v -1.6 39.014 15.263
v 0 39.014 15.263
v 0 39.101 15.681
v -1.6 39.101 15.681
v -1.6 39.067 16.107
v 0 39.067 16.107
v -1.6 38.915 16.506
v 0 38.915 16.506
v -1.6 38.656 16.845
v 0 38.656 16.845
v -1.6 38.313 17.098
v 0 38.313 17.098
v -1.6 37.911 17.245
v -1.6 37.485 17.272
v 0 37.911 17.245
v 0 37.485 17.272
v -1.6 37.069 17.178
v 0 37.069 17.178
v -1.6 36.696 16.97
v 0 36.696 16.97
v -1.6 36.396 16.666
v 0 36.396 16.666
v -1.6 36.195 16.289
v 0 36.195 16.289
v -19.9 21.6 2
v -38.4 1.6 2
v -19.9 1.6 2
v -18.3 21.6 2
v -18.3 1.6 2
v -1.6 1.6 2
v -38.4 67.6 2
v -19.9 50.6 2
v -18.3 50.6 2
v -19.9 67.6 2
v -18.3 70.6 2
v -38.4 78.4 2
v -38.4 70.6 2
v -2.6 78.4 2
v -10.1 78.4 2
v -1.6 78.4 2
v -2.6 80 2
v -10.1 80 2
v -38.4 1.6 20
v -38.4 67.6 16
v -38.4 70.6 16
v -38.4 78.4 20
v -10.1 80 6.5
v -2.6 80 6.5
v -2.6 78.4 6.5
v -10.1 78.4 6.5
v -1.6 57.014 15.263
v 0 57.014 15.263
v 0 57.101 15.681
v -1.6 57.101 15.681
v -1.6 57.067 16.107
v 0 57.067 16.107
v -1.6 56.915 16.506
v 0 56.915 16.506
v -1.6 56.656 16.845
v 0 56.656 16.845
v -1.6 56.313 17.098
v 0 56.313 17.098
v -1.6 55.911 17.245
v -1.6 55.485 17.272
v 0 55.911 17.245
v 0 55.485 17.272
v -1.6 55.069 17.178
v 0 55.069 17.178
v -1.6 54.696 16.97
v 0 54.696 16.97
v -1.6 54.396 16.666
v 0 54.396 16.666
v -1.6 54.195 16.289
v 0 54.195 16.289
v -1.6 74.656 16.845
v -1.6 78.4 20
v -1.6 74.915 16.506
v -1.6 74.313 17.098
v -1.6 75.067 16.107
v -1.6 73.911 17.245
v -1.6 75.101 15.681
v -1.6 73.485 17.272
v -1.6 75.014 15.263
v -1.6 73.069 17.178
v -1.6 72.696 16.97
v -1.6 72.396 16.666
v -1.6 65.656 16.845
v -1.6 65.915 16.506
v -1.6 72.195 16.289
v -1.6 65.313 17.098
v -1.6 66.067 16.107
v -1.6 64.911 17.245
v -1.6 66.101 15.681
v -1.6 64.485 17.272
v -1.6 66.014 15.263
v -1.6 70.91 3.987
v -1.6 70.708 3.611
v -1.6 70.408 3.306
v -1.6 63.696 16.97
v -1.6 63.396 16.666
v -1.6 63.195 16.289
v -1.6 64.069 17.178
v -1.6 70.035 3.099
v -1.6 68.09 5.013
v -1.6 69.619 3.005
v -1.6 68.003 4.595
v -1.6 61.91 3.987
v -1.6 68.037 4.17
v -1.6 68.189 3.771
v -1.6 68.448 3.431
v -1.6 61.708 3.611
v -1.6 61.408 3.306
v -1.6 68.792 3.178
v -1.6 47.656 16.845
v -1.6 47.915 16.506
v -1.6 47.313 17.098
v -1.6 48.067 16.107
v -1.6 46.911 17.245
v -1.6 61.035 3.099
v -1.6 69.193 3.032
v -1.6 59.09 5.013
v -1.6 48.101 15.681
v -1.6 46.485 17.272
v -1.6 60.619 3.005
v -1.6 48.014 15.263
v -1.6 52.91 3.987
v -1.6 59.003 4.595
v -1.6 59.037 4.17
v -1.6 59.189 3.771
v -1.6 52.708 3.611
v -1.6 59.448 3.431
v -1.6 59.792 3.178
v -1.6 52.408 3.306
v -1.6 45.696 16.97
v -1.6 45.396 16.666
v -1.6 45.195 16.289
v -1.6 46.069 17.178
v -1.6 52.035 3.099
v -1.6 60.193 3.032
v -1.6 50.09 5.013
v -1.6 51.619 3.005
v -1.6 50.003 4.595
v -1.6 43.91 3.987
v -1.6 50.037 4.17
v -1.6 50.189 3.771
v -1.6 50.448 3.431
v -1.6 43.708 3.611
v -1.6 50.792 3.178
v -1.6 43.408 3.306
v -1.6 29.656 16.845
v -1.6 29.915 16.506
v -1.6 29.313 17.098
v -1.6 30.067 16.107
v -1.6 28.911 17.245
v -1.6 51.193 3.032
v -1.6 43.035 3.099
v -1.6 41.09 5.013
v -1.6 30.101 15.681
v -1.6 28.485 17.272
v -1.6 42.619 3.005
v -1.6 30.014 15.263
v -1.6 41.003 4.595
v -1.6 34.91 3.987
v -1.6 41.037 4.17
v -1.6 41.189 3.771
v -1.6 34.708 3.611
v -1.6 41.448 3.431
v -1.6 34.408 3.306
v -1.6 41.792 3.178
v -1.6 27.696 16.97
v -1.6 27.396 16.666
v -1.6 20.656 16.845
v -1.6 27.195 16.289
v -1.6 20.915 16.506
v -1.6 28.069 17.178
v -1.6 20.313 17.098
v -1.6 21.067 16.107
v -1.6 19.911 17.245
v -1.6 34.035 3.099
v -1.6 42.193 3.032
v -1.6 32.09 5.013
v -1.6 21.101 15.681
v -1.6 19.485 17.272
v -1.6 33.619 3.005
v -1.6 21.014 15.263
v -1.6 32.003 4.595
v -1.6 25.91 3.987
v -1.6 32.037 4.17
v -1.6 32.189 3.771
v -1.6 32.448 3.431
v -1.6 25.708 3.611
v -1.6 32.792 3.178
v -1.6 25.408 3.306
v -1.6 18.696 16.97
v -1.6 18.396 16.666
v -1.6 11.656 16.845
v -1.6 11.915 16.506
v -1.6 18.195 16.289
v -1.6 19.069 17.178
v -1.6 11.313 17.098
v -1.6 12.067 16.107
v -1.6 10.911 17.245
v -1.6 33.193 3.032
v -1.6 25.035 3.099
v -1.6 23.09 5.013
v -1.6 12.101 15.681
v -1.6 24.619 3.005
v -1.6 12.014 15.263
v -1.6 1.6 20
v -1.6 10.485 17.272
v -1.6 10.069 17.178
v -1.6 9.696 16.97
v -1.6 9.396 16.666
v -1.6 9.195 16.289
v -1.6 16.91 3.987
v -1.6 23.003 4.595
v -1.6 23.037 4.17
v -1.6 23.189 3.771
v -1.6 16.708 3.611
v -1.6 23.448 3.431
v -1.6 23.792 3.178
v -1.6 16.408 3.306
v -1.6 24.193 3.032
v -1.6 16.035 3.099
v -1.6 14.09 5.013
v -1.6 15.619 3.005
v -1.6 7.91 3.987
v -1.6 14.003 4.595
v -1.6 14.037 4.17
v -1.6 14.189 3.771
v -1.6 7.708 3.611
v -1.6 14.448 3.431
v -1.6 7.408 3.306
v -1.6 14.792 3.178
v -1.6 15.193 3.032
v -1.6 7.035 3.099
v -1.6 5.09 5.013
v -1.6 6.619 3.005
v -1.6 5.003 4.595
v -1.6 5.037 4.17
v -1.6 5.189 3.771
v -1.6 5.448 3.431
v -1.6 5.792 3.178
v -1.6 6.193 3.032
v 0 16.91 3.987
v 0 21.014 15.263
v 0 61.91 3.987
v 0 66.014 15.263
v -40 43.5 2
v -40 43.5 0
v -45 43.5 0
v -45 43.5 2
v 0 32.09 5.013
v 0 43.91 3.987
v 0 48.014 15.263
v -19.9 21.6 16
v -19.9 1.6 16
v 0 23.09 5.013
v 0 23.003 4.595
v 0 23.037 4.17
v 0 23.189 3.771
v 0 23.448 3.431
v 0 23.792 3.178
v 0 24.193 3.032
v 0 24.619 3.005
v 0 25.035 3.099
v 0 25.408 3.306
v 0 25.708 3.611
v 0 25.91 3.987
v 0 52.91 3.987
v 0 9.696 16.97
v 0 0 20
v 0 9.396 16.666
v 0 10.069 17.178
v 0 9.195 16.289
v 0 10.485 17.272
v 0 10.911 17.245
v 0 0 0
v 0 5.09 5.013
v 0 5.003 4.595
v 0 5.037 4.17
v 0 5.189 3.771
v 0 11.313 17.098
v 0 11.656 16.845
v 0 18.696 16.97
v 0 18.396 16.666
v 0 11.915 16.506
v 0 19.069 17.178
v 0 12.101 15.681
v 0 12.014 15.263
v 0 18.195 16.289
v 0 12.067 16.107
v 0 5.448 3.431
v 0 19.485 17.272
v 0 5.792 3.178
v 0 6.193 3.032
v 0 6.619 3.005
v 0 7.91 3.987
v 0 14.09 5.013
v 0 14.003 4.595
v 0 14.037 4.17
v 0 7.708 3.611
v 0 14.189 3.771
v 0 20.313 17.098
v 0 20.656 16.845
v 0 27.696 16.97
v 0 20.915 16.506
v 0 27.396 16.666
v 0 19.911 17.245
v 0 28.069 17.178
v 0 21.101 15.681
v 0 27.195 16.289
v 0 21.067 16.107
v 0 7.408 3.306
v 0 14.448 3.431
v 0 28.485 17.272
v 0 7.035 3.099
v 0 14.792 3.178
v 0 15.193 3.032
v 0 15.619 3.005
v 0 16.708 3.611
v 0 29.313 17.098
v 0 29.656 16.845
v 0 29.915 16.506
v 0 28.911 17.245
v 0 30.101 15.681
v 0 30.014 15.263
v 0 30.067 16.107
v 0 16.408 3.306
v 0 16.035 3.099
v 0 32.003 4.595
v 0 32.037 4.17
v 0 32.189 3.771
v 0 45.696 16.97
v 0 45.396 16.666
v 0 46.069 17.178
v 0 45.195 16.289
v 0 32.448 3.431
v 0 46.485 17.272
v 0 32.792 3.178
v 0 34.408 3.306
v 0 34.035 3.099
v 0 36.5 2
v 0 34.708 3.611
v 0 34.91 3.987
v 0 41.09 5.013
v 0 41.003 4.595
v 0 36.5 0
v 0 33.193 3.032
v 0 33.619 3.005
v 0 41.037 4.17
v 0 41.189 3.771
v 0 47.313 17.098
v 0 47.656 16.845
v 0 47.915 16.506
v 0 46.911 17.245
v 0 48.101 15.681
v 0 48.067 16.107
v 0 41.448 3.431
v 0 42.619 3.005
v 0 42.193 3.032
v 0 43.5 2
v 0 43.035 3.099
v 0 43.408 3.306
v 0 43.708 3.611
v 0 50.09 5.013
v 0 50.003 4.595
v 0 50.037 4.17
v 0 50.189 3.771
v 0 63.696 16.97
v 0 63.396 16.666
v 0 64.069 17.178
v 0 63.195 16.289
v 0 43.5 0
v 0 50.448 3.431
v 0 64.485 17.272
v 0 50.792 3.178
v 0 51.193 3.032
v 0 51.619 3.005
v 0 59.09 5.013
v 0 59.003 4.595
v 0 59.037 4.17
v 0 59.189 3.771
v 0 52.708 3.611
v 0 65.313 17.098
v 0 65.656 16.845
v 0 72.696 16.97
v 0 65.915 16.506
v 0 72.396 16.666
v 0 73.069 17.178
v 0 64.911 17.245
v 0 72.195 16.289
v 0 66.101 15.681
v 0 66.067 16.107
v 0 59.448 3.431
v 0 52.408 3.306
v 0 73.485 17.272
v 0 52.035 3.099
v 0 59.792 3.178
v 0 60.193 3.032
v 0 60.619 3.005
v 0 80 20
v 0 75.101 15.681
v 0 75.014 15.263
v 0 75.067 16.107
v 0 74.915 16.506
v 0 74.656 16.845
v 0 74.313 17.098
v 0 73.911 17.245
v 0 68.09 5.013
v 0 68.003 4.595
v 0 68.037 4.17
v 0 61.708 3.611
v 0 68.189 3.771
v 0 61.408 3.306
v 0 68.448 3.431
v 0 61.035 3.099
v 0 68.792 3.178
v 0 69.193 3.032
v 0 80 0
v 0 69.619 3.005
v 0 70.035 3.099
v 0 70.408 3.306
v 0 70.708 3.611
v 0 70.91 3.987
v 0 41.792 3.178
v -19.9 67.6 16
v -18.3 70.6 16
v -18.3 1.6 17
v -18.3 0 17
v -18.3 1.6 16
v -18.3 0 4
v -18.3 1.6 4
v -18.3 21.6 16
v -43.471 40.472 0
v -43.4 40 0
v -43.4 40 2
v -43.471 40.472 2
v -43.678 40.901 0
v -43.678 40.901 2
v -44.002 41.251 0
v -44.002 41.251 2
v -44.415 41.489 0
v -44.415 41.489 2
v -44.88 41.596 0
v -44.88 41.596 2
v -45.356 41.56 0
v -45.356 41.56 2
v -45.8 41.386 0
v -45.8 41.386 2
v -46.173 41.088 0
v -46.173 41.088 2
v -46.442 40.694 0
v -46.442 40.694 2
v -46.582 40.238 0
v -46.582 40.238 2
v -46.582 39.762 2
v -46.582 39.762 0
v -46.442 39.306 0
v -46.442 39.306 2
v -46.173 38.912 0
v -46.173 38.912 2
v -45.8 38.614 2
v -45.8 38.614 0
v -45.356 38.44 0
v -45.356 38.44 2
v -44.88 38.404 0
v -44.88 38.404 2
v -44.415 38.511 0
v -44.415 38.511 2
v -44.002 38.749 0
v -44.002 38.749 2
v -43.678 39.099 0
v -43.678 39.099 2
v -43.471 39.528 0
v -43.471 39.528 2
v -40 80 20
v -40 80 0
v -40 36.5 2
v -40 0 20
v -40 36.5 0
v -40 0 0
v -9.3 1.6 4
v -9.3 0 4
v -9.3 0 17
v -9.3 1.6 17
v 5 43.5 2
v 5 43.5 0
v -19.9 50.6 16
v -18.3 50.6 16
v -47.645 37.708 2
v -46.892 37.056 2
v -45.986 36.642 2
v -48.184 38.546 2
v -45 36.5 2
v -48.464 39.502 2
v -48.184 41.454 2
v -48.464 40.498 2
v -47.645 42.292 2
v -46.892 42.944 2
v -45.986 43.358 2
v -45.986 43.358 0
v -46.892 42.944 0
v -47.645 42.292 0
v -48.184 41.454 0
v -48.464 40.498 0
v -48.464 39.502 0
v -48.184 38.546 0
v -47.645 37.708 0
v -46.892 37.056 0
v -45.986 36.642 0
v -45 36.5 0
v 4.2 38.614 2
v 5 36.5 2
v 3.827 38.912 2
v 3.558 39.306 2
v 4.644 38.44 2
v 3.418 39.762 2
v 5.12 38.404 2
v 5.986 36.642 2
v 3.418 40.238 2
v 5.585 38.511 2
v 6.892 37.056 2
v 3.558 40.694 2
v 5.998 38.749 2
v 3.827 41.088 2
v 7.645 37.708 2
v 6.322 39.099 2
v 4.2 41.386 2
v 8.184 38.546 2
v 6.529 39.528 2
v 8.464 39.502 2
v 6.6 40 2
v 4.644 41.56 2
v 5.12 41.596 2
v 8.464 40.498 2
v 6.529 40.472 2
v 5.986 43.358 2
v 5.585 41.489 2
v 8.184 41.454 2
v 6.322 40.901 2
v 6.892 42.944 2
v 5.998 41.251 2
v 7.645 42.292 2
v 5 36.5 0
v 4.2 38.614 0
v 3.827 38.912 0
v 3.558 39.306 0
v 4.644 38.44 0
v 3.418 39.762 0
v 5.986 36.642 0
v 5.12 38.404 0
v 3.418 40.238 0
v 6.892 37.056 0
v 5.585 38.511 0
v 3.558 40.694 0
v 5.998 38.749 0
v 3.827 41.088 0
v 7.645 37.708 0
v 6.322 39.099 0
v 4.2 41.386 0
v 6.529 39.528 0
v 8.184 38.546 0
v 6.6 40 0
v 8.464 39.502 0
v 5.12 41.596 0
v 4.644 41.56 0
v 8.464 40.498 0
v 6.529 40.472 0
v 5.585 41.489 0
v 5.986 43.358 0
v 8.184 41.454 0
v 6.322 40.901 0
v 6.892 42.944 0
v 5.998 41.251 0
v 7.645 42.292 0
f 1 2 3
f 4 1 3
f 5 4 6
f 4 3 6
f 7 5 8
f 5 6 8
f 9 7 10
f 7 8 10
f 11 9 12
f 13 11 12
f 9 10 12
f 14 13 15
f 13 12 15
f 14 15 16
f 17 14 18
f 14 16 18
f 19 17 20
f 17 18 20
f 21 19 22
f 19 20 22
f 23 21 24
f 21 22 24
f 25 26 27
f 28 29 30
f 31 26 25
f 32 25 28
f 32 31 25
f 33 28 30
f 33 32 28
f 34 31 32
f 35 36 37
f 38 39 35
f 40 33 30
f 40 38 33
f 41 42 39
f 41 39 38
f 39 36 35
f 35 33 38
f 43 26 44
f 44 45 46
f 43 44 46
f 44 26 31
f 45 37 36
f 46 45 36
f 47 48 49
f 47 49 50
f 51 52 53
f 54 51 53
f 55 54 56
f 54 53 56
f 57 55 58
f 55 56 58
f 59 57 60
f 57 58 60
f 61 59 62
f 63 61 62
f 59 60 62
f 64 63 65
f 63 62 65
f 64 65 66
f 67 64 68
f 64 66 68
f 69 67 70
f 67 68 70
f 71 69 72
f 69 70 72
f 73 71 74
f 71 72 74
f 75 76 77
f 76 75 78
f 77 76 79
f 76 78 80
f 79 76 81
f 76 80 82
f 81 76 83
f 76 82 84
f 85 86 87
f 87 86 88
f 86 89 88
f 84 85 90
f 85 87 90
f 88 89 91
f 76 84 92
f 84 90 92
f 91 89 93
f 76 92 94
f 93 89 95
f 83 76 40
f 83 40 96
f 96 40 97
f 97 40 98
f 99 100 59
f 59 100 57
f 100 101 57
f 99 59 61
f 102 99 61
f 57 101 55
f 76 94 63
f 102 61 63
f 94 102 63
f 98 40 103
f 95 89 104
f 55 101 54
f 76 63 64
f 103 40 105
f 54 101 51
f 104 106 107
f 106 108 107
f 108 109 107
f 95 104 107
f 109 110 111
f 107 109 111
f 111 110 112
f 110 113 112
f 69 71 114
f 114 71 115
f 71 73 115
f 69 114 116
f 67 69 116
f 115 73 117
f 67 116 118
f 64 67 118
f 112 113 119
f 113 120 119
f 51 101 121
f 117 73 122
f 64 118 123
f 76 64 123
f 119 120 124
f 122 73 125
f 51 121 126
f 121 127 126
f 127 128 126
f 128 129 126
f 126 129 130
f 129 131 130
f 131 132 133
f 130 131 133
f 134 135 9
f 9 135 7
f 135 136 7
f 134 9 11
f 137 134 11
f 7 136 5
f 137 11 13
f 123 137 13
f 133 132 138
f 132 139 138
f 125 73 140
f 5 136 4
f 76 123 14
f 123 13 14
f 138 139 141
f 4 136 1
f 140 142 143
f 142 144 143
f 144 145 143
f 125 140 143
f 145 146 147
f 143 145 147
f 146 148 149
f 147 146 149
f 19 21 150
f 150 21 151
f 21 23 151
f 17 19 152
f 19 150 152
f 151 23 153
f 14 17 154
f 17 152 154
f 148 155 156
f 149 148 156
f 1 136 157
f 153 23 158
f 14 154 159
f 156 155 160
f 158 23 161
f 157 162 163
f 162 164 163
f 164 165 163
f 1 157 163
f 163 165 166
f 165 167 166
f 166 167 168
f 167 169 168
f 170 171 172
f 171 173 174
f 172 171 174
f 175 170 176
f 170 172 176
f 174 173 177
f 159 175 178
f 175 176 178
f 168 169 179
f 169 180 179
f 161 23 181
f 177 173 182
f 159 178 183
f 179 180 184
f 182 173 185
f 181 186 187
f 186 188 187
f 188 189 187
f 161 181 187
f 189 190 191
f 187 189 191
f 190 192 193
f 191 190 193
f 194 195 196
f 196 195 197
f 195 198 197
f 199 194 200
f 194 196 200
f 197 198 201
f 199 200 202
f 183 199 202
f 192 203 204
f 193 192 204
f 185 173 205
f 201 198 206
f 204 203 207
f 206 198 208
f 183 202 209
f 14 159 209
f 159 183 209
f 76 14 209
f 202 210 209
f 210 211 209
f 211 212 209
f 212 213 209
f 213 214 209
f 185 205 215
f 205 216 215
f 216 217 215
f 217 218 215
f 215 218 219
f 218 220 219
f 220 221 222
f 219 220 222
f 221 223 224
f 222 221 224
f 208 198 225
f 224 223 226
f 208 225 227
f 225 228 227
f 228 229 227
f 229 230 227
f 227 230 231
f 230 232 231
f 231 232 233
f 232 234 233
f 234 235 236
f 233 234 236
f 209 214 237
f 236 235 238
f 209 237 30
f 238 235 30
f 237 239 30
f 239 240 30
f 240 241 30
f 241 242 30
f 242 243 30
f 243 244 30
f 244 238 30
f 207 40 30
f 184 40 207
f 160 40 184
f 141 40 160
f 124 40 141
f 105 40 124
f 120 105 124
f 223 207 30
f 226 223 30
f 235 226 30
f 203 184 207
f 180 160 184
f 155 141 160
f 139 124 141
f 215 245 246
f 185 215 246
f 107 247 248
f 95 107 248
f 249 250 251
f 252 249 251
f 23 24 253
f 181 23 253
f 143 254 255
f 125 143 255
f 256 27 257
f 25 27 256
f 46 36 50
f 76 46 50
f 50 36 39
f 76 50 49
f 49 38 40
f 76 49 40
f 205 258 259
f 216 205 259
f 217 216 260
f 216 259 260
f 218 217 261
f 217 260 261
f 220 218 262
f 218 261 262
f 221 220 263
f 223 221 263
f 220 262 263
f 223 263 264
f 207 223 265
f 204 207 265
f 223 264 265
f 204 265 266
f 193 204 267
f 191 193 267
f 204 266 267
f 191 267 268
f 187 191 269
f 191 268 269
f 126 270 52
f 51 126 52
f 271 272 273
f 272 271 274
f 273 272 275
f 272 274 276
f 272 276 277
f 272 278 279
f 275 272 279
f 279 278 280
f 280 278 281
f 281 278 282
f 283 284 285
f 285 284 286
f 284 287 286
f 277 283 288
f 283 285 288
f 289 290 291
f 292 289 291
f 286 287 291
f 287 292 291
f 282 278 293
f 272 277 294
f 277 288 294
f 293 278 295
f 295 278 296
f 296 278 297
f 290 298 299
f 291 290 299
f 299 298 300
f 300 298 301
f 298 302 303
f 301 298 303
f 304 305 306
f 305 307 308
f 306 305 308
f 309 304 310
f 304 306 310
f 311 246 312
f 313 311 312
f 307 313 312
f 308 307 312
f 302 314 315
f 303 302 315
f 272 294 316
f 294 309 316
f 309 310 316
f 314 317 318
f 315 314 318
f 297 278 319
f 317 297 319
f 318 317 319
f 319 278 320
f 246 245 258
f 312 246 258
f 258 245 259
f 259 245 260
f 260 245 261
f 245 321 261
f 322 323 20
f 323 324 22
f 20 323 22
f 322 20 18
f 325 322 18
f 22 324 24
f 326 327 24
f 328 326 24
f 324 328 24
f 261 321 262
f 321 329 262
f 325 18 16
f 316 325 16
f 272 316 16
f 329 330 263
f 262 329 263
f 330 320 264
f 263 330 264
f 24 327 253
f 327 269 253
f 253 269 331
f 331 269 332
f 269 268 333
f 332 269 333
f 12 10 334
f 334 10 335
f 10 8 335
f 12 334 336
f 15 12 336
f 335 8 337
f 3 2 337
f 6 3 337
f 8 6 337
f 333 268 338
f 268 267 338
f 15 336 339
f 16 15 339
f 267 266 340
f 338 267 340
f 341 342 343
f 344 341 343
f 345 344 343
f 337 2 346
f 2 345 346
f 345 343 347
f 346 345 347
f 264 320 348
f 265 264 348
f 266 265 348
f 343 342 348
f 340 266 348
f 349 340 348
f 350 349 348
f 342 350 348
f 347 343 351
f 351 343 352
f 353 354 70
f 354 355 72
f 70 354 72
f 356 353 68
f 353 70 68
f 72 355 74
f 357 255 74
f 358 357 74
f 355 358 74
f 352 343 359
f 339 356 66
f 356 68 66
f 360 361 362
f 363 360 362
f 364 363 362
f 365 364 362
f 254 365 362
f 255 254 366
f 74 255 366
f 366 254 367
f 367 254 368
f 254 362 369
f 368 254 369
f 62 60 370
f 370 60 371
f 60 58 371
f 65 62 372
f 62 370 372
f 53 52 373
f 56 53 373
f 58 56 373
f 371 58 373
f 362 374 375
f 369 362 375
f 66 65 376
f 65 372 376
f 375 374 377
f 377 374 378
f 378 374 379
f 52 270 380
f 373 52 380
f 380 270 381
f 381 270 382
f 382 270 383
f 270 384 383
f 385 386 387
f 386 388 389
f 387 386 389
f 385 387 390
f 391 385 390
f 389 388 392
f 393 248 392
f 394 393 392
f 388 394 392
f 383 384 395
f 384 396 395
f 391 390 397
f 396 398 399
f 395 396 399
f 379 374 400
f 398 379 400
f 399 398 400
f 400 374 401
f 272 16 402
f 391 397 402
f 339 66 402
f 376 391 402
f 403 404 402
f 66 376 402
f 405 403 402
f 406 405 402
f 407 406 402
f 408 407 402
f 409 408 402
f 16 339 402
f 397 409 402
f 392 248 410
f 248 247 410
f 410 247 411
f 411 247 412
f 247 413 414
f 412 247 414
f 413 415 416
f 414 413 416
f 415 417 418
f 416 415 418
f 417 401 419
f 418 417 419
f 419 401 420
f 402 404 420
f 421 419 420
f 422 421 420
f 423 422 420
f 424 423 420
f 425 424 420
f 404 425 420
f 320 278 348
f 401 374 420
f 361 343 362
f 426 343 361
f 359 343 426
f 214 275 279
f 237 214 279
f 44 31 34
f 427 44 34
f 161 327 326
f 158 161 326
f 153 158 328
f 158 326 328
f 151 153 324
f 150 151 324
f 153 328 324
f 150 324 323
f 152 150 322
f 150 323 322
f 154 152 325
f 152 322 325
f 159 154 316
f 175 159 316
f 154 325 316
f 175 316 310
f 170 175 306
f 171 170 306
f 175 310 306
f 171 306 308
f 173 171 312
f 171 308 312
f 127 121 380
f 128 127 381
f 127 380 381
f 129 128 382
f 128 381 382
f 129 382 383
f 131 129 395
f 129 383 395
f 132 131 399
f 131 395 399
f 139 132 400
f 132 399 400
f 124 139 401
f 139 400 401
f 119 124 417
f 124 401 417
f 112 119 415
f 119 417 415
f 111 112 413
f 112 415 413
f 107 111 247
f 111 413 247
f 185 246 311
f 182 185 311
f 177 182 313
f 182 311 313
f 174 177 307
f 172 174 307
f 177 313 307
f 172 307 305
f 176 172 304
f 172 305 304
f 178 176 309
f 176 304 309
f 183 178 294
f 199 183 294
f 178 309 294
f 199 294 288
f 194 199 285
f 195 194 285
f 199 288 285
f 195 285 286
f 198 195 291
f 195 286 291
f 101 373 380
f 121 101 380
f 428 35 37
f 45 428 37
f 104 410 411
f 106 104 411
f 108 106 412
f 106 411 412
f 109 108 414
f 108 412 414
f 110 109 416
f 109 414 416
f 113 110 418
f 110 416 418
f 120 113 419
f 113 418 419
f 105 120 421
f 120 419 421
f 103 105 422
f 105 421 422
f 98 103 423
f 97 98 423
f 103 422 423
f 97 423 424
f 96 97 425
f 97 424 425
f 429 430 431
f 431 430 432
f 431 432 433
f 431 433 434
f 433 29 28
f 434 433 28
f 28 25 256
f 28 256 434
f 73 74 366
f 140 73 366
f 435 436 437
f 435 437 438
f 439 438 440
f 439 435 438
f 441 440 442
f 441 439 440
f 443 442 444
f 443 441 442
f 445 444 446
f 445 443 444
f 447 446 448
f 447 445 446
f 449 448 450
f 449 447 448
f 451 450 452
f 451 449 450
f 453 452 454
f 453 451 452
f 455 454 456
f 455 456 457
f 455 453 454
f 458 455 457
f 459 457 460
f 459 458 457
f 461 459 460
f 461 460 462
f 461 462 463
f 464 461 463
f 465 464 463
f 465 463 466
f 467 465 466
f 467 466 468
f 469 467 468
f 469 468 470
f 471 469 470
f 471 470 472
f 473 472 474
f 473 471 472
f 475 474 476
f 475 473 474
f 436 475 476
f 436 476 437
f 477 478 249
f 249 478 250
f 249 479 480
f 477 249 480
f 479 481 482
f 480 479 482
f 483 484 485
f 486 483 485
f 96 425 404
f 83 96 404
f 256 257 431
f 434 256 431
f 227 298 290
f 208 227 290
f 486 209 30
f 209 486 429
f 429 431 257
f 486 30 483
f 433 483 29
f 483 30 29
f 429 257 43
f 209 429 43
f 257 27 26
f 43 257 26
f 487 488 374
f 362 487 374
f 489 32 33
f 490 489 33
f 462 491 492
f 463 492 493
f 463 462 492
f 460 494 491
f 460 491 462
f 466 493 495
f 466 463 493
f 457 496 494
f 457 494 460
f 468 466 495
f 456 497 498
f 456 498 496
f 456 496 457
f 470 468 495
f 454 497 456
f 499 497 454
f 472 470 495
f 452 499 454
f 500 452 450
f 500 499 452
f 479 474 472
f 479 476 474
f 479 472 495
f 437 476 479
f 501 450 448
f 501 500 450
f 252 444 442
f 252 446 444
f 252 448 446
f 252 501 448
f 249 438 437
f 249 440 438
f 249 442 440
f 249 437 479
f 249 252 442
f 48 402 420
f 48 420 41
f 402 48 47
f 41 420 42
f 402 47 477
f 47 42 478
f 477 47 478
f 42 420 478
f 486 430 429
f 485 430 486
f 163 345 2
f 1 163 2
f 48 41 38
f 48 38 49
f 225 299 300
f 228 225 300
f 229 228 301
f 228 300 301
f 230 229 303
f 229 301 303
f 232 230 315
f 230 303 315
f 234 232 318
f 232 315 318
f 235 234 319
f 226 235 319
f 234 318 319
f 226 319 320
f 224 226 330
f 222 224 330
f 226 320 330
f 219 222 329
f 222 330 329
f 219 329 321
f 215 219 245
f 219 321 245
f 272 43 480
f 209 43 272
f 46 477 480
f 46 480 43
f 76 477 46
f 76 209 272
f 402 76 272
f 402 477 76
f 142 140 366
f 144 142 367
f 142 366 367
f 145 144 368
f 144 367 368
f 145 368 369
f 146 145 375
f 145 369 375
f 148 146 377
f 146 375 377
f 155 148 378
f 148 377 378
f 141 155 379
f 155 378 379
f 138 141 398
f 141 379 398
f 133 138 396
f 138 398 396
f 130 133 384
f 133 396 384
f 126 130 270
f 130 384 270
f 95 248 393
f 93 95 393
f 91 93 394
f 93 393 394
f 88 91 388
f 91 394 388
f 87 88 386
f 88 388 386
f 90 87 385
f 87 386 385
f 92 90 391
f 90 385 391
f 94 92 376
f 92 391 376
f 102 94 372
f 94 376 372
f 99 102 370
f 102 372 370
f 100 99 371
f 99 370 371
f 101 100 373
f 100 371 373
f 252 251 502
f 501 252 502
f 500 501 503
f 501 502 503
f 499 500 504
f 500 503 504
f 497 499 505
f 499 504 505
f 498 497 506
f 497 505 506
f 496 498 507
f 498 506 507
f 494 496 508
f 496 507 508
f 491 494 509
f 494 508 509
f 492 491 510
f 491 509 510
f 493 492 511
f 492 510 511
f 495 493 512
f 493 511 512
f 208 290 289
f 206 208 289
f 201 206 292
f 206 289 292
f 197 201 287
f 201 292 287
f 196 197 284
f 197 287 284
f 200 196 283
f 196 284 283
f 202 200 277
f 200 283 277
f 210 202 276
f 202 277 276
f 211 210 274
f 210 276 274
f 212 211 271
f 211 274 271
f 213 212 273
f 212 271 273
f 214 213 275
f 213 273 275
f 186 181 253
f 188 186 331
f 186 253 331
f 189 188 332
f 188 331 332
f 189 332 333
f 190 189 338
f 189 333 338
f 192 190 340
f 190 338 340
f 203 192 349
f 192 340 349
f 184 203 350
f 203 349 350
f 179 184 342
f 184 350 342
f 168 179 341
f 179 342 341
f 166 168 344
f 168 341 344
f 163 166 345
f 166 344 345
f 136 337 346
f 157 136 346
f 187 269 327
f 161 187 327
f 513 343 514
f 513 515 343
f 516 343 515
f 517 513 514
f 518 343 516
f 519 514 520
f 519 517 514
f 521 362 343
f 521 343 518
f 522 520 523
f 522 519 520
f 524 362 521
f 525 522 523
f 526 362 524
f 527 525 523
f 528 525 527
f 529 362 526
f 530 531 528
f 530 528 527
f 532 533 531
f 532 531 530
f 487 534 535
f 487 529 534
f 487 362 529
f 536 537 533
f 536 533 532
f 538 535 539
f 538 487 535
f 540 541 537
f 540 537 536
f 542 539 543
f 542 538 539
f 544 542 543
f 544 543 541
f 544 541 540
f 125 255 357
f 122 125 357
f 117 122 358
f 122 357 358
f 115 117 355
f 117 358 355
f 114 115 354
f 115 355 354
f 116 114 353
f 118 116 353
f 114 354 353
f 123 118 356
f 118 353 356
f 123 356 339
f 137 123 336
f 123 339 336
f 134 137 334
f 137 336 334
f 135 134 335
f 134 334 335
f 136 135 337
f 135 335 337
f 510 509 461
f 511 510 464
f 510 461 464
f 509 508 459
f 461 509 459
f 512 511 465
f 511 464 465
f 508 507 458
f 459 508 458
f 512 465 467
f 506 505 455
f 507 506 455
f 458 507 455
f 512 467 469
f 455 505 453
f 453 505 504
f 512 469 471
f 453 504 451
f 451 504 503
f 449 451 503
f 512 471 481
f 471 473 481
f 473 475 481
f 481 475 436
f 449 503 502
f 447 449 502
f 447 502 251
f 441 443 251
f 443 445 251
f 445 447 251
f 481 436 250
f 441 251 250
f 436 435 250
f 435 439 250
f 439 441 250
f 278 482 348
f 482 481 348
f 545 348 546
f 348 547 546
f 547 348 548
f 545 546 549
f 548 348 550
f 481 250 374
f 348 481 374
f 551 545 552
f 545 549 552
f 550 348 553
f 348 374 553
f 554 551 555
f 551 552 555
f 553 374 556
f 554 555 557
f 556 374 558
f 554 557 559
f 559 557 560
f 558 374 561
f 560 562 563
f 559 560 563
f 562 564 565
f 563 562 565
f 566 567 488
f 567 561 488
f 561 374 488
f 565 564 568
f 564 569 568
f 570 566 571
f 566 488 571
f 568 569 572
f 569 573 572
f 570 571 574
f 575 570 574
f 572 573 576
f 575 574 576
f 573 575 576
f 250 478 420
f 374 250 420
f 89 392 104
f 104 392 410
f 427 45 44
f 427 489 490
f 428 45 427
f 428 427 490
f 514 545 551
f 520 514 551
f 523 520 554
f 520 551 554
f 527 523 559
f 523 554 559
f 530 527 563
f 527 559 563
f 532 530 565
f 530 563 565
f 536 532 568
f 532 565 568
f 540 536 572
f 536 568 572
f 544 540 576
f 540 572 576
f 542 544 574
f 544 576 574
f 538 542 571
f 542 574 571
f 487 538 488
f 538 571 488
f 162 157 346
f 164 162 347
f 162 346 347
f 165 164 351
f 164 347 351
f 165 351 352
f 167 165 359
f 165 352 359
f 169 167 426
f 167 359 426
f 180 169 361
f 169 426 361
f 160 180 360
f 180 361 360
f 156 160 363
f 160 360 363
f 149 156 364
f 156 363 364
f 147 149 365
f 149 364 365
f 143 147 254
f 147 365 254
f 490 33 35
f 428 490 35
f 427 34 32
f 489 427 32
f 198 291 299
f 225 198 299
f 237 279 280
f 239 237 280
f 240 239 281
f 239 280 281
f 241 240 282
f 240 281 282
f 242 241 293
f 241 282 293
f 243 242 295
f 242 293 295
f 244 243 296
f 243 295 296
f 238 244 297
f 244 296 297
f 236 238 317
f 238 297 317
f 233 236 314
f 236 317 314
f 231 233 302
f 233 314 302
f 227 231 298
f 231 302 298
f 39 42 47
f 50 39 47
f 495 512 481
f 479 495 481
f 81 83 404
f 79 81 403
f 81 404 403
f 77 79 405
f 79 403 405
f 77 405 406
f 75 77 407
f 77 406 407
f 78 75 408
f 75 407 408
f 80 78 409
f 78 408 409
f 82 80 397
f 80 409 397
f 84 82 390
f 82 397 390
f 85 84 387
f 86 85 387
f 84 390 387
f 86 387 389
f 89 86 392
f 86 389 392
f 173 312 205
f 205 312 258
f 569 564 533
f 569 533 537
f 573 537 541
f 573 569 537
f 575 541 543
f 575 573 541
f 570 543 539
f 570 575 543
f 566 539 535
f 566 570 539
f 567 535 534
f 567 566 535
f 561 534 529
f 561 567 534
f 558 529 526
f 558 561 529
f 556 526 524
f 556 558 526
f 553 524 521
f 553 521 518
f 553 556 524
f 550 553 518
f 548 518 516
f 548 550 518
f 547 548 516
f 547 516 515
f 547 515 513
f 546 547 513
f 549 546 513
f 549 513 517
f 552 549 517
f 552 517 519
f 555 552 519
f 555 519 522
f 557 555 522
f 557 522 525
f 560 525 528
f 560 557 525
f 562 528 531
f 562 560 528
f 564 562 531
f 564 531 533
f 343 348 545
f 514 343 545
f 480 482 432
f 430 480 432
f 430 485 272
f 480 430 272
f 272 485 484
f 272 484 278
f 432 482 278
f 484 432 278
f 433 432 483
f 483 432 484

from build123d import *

# Parameters (mm, degrees)
F1_DEPTH  = 20
F2_DEPTH  = 2
F0_W      = 1.6
F0_H      = 20
F3_DEPTH  = 16
F4_W      = 9
F4_H      = 13
F5_DEPTH  = 10
F7_DEPTH  = 5
F8_W      = 7.5
F8_H      = 4.5
F9_DEPTH  = 5
F0_R      = 1.6
F10_DEPTH = 2


with BuildPart() as f1:
    # F0 (on Top) → F1 (new body)
    with BuildSketch(Plane.XY):
        Polygon((-40, 0), (0, 0), (0, 36.5), (0, 43.5), (0, 80), (-40, 80), (-40, 43.5), (-40, 36.5), align=None)
        Polygon((-1.6, 78.4), (-1.6, 1.6), (-18.3, 1.6), (-19.9, 1.6), (-38.4, 1.6), (-38.4, 67.6), (-38.4, 70.6), (-38.4, 78.4), align=None, mode=Mode.SUBTRACT)
    extrude(amount=F1_DEPTH)

    # F0 (on Top) → F2 (join)
    with BuildSketch(Plane.XY):
        Polygon((-18.3, 1.6), (-1.6, 1.6), (-1.6, 78.4), (-38.4, 78.4), (-38.4, 70.6), (-18.3, 70.6), (-18.3, 50.6), (-19.9, 50.6), (-19.9, 67.6), (-38.4, 67.6), (-38.4, 1.6), (-19.9, 1.6), (-19.9, 21.6), (-18.3, 21.6), align=None)
    extrude(amount=F2_DEPTH)

    # F0 (on Top) → F3 (join)
    with BuildSketch(Plane.XY):
        Polygon((-18.3, 70.6), (-38.4, 70.6), (-38.4, 67.6), (-19.9, 67.6), (-19.9, 50.6), (-18.3, 50.6), align=None)
        with Locations((-19.1, 11.6)):
            Rectangle(F0_W, F0_H)
    extrude(amount=F3_DEPTH)

    # F4 (on face) → F5 (cut)
    with BuildSketch(Plane.XZ):
        with Locations((-13.8, 10.5)):
            Rectangle(F4_W, F4_H)
    extrude(amount=-F5_DEPTH, mode=Mode.SUBTRACT)

    # F6 (on face) → F7 (cut)
    with BuildSketch(Plane.YZ):
        with BuildLine():
            Line((9.194703, 16.289342), (5.090461, 5.01303))
            ThreePointArc((5.090461, 5.01303), (5.98697, 3.090461), (7.909539, 3.98697))
            Line((7.909539, 3.98697), (12.013781, 15.263281))
            ThreePointArc((12.013781, 15.263281), (11.117272, 17.18585), (9.194703, 16.289342))
        make_face()
        with BuildLine():
            Line((16.909539, 3.98697), (21.013781, 15.263281))
            ThreePointArc((21.013781, 15.263281), (20.117272, 17.18585), (18.194703, 16.289342))
            Line((18.194703, 16.289342), (14.090461, 5.01303))
            ThreePointArc((14.090461, 5.01303), (14.98697, 3.090461), (16.909539, 3.98697))
        make_face()
        with BuildLine():
            Line((25.909539, 3.98697), (30.013781, 15.263281))
            ThreePointArc((30.013781, 15.263281), (29.117272, 17.18585), (27.194703, 16.289342))
            Line((27.194703, 16.289342), (23.090461, 5.01303))
            ThreePointArc((23.090461, 5.01303), (23.98697, 3.090461), (25.909539, 3.98697))
        make_face()
        with BuildLine():
            Line((34.909539, 3.98697), (39.013781, 15.263281))
            ThreePointArc((39.013781, 15.263281), (38.117272, 17.18585), (36.194703, 16.289342))
            Line((36.194703, 16.289342), (32.090461, 5.01303))
            ThreePointArc((32.090461, 5.01303), (32.98697, 3.090461), (34.909539, 3.98697))
        make_face()
        with BuildLine():
            Line((43.909539, 3.98697), (48.013781, 15.263281))
            ThreePointArc((48.013781, 15.263281), (47.117272, 17.18585), (45.194703, 16.289342))
            Line((45.194703, 16.289342), (41.090461, 5.01303))
            ThreePointArc((41.090461, 5.01303), (41.98697, 3.090461), (43.909539, 3.98697))
        make_face()
        with BuildLine():
            Line((52.909539, 3.98697), (57.013781, 15.263281))
            ThreePointArc((57.013781, 15.263281), (56.117272, 17.18585), (54.194703, 16.289342))
            Line((54.194703, 16.289342), (50.090461, 5.01303))
            ThreePointArc((50.090461, 5.01303), (50.98697, 3.090461), (52.909539, 3.98697))
        make_face()
        with BuildLine():
            Line((61.909539, 3.98697), (66.013781, 15.263281))
            ThreePointArc((66.013781, 15.263281), (65.117272, 17.18585), (63.194703, 16.289342))
            Line((63.194703, 16.289342), (59.090461, 5.01303))
            ThreePointArc((59.090461, 5.01303), (59.98697, 3.090461), (61.909539, 3.98697))
        make_face()
        with BuildLine():
            Line((70.909539, 3.98697), (75.013781, 15.263281))
            ThreePointArc((75.013781, 15.263281), (74.117272, 17.18585), (72.194703, 16.289342))
            Line((72.194703, 16.289342), (68.090461, 5.01303))
            ThreePointArc((68.090461, 5.01303), (68.98697, 3.090461), (70.909539, 3.98697))
        make_face()
    extrude(amount=-F7_DEPTH, mode=Mode.SUBTRACT)

    # F8 (on face) → F9 (cut)
    with BuildSketch(Plane(origin=(0, 80, 0), x_dir=(-1, 0, 0), z_dir=(0, 1, 0))):
        with Locations((6.35, 4.25)):
            Rectangle(F8_W, F8_H)
    extrude(amount=-F9_DEPTH, mode=Mode.SUBTRACT)

    # F0 (on Top) → F10 (join)
    with BuildSketch(Plane.XY):
        with BuildLine():
            Line((-45, 36.5), (-40, 36.5))
            Line((-40, 36.5), (-40, 43.5))
            Line((-40, 43.5), (-45, 43.5))
            ThreePointArc((-45, 43.5), (-48.5, 40), (-45, 36.5))
        make_face()
        with Locations((-45, 40)):
            Circle(F0_R, mode=Mode.SUBTRACT)
        with BuildLine():
            Line((0, 43.5), (0, 36.5))
            Line((0, 36.5), (5, 36.5))
            ThreePointArc((5, 36.5), (8.5, 40), (5, 43.5))
            Line((5, 43.5), (0, 43.5))
        make_face()
        with Locations((5, 40)):
            Circle(F0_R, mode=Mode.SUBTRACT)
    extrude(amount=F10_DEPTH)


solid = f1.part
